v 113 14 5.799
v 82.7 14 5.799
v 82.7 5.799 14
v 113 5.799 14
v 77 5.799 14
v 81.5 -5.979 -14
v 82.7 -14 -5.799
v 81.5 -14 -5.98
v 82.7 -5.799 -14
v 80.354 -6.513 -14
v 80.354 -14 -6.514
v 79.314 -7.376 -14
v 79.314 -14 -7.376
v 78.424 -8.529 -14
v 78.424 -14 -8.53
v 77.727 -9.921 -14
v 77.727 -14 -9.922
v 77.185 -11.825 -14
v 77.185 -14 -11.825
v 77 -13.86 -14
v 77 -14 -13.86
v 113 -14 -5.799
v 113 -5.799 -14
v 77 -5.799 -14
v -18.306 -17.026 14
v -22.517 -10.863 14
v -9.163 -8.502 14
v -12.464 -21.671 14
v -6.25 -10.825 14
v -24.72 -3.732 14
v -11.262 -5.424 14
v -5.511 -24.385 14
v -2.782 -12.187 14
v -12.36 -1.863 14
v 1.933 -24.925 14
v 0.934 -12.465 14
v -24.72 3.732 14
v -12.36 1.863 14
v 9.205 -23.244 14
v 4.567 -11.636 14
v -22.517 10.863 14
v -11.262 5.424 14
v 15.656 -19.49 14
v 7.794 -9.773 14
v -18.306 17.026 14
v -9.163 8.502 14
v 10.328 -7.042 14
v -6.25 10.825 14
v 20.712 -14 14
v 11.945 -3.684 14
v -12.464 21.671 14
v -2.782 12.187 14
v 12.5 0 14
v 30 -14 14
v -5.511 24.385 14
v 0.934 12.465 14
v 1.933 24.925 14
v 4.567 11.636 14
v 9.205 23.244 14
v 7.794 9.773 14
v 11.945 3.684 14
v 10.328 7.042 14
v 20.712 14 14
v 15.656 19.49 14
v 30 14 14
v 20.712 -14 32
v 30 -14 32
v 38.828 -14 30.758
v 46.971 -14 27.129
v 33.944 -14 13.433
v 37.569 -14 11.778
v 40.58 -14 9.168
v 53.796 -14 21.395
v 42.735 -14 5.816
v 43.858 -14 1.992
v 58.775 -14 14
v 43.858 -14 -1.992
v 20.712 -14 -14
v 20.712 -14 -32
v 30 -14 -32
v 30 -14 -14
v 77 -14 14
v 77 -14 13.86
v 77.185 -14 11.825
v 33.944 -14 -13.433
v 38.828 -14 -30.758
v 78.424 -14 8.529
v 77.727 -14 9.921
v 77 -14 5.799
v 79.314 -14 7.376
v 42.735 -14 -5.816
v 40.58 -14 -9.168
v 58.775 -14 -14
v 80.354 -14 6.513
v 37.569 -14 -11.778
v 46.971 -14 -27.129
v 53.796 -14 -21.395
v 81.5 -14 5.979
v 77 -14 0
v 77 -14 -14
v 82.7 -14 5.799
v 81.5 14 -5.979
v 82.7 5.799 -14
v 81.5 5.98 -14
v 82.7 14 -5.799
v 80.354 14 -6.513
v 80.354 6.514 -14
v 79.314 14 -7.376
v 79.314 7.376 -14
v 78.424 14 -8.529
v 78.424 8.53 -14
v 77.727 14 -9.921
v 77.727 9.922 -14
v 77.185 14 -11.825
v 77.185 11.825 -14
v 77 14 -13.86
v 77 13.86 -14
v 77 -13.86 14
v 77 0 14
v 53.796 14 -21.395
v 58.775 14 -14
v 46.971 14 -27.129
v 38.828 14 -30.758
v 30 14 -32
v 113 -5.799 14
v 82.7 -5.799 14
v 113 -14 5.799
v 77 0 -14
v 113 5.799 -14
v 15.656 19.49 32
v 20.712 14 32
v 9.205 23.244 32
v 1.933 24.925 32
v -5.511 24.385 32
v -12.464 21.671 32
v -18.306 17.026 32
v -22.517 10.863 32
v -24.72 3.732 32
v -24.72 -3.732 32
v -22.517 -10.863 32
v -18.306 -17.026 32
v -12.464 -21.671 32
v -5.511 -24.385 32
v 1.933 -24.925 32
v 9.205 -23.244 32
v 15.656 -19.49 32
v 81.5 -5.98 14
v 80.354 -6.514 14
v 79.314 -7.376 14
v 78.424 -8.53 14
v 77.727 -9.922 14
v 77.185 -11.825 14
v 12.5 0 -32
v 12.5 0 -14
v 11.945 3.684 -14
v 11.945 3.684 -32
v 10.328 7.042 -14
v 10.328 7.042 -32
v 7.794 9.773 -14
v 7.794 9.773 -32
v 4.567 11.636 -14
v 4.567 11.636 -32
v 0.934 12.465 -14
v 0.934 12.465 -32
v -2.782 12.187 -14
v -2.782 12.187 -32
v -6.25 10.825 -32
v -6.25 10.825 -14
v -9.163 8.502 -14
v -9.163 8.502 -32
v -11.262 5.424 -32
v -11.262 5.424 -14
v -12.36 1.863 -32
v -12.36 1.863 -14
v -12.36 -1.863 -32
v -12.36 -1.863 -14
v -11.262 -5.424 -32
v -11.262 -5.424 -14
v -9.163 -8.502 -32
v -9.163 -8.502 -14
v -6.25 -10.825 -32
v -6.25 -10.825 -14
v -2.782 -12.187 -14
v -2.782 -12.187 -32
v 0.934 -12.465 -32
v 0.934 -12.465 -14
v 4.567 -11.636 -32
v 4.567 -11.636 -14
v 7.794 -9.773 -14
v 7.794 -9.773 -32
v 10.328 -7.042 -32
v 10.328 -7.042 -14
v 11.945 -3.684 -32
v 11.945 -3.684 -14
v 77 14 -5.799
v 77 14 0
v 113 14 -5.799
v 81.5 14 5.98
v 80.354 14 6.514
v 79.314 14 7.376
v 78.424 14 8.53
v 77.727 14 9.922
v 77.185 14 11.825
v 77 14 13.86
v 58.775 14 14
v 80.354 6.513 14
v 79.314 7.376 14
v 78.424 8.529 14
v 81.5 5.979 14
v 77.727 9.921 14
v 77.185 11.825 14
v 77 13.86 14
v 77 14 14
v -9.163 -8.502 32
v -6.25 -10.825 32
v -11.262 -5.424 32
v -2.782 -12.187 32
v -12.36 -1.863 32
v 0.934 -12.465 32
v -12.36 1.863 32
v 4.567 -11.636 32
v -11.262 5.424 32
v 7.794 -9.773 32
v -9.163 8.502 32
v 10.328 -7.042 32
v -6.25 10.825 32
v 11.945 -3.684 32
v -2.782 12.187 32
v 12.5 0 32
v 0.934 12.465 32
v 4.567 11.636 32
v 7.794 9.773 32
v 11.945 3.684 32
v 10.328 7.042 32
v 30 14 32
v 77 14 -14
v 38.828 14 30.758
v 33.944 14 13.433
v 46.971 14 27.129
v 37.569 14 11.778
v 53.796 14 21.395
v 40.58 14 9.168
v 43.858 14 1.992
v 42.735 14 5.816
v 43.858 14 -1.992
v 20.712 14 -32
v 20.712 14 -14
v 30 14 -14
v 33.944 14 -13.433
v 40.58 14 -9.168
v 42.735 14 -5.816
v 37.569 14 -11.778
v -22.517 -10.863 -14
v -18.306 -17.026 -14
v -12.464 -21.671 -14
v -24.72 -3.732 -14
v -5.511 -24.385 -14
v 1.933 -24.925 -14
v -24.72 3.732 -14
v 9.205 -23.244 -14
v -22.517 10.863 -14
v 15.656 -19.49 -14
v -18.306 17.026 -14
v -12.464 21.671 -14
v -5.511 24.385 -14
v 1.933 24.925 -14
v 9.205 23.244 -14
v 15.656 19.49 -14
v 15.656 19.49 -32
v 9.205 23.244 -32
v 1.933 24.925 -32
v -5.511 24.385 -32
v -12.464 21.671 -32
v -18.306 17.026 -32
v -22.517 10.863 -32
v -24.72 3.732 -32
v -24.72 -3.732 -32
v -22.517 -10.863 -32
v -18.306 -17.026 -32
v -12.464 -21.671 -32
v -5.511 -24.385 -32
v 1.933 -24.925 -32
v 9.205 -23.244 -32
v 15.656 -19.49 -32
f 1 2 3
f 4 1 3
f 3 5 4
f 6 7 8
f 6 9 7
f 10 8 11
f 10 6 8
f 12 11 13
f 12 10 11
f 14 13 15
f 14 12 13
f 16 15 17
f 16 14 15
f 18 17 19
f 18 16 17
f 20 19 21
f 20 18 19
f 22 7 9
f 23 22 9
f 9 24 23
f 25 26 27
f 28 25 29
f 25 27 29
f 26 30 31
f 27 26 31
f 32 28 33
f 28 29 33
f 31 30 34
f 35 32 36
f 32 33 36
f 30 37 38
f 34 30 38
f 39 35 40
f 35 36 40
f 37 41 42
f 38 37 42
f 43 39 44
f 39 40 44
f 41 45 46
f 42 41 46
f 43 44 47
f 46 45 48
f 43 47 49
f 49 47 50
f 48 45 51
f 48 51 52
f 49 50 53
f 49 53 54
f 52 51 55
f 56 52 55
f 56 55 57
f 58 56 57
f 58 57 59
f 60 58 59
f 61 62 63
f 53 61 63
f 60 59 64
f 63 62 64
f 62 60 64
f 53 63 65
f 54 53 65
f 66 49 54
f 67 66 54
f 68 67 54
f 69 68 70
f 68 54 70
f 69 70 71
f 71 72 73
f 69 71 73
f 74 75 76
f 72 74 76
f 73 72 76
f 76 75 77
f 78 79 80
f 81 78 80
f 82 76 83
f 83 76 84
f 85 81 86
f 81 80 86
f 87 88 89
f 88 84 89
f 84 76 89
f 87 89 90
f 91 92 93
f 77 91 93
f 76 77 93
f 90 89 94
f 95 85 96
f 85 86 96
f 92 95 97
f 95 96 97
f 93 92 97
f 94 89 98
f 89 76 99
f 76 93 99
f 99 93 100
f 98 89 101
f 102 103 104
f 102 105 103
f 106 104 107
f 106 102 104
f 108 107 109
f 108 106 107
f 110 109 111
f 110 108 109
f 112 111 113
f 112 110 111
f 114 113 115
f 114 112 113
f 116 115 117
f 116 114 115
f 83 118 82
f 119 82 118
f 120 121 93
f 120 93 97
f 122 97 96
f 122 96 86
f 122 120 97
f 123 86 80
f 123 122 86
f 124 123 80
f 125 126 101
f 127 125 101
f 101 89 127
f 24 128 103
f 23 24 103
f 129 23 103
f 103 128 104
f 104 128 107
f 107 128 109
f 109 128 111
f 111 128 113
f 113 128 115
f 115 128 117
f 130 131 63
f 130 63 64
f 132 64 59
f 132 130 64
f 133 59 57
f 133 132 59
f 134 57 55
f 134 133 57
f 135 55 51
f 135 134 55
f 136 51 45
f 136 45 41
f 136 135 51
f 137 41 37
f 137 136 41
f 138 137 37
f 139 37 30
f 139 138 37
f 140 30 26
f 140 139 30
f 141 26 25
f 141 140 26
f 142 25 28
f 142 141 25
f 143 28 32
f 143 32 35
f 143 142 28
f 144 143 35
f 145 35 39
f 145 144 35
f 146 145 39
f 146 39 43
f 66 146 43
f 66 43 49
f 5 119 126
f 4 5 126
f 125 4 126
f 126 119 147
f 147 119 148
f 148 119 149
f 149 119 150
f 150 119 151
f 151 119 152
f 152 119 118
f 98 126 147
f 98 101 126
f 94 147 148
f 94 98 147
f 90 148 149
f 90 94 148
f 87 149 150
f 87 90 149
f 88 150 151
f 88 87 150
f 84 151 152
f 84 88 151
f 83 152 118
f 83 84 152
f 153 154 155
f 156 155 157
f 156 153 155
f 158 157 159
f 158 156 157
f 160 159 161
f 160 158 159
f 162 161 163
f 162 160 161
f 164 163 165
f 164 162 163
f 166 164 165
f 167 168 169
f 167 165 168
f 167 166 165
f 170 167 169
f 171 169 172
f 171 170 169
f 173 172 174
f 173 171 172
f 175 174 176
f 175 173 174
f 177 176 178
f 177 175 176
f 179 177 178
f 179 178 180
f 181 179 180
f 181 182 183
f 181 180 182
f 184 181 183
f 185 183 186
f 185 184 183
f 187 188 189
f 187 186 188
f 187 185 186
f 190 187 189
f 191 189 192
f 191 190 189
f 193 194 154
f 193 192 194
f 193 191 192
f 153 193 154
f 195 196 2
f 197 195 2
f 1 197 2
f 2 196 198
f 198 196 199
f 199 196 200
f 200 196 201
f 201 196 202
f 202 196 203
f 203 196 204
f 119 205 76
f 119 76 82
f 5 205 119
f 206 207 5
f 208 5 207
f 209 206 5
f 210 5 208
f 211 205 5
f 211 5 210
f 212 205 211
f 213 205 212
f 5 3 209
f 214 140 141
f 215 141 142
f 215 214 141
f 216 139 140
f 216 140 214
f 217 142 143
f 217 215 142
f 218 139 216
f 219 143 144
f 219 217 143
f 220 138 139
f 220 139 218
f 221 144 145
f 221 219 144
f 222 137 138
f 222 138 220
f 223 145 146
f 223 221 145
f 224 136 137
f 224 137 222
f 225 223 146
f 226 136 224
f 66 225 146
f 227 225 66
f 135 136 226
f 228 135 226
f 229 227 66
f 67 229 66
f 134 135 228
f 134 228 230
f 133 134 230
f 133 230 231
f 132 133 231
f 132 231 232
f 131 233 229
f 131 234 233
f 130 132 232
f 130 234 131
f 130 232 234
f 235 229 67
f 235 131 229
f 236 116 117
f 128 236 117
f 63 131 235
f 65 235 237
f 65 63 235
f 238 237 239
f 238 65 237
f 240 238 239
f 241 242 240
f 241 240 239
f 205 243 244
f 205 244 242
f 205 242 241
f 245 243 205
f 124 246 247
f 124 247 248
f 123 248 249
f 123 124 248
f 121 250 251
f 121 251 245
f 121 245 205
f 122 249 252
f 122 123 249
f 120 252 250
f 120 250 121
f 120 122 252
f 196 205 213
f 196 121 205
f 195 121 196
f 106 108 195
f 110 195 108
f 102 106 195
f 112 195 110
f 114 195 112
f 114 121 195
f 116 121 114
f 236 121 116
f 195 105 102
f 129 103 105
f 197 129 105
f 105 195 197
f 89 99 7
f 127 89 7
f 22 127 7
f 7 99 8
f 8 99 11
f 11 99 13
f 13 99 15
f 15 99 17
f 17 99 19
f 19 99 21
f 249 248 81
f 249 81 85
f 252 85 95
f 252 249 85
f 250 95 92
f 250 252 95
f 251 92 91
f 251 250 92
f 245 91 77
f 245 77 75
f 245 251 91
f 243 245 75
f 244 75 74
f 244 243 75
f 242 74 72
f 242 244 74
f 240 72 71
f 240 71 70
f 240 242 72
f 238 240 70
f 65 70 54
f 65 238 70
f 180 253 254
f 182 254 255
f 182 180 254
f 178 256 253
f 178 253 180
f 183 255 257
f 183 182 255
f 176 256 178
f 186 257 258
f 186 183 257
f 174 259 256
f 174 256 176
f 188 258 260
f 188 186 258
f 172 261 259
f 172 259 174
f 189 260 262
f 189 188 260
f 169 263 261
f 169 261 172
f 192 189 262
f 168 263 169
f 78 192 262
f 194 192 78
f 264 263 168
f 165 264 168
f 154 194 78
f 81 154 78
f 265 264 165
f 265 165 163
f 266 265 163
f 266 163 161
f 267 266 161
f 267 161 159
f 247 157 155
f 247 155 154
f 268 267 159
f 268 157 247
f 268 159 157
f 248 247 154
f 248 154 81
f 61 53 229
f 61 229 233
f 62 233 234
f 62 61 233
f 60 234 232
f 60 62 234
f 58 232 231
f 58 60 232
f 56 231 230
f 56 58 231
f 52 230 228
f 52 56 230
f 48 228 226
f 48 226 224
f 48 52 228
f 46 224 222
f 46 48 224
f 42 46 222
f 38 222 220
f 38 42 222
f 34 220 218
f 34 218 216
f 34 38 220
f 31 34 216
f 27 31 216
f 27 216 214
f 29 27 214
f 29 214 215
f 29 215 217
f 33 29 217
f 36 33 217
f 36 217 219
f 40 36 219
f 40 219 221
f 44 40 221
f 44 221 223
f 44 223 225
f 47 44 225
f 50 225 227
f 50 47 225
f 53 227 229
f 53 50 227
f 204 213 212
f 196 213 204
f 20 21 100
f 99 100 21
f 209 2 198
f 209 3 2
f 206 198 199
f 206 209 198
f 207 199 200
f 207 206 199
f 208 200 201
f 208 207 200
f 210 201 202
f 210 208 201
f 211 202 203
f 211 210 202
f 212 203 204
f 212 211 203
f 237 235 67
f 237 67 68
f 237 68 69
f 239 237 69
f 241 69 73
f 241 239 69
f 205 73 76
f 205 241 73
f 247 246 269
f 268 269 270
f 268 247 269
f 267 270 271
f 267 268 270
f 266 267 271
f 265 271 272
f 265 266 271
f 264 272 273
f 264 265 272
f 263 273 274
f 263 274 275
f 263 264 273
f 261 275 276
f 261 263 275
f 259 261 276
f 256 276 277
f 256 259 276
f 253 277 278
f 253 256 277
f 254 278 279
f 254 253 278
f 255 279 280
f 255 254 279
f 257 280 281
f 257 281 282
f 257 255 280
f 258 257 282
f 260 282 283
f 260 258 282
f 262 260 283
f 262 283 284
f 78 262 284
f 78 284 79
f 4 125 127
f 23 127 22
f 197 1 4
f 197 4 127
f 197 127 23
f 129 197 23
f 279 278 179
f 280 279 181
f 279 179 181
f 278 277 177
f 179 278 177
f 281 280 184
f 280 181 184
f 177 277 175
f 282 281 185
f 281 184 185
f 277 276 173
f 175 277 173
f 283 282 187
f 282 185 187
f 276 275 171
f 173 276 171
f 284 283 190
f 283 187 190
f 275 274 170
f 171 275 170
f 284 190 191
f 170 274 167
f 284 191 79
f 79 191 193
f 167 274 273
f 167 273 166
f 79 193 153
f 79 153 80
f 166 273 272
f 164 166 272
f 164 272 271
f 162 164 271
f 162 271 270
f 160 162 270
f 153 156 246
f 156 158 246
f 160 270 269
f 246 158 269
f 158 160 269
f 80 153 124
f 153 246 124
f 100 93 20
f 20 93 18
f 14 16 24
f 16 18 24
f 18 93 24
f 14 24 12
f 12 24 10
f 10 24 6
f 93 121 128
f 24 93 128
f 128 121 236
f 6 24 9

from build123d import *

# Parameters (mm, degrees)
CROQUIS1_R              = 12.5
SALIENTE_EXTRUIR2_DEPTH = 32
CROQUIS3_W              = 110
CROQUIS3_H              = 28
CORTAR_EXTRUIR1_DEPTH   = 32
SALIENTE_EXTRUIR3_DEPTH = 28
CROQUIS9_W              = 30
CROQUIS9_H              = 28
SALIENTE_EXTRUIR4_DEPTH = 14
SALIENTE_EXTRUIR5_DEPTH = 36
REDONDEO2_R             = 5.7


with BuildPart() as part:
    # Croquis1 → Saliente-Extruir2 (new, symmetric)
    with BuildSketch(Plane.XY):
        with BuildLine():
            Line((20.712315177, -14), (30, -14))
            Line((30, -14), (30, 14))
            Line((30, 14), (20.712315177, 14))
            ThreePointArc((20.712315177, 14), (-25, 0), (20.712315177, -14))
        make_face()
        Circle(CROQUIS1_R, mode=Mode.SUBTRACT)
    extrude(amount=SALIENTE_EXTRUIR2_DEPTH, both=True)

    # Croquis3 → Cortar-Extruir1 (cut, symmetric)
    with BuildSketch(Plane(origin=(0, 0, 0), x_dir=(1, 0, 0), z_dir=(0, 1, 0))):
        with Locations((-25, 0)):
            Rectangle(CROQUIS3_W, CROQUIS3_H)
    extrude(amount=CORTAR_EXTRUIR1_DEPTH, both=True, mode=Mode.SUBTRACT)


with BuildPart() as cortar_extruir1_piece_1:
    # of the separate pieces the step leaves, piece 1, a body of its own (cortar_extruir1_pieces)
    add(part.part.solids().sort_by_distance((20.712315177, -14, -14))[0])



with BuildPart() as cortar_extruir1_piece_2:
    # of the separate pieces the step leaves, piece 2, a body of its own (cortar_extruir1_pieces)
    add(part.part.solids().sort_by_distance((20.712315177, -14, 32))[0])


with BuildPart() as cortar_extruir1_piece_1_1:
    add(cortar_extruir1_piece_1.part)

    add(cortar_extruir1_piece_2.part)  # Saliente-Extruir3 merges Cortar-Extruir1 piece 2
    # Croquis7 → Saliente-Extruir3 (add)
    with BuildSketch(Plane(origin=(0, 14, 0), x_dir=(1, 0, 0), z_dir=(0, 1, 0))):
        with BuildLine():
            Line((30, 32), (30, 14))
            ThreePointArc((30, 14), (44, 0), (30, -14))
            Line((30, -14), (30, -32))
            ThreePointArc((30, -32), (62, 0), (30, 32))
        make_face()
    extrude(amount=-SALIENTE_EXTRUIR3_DEPTH)

    # Croquis9 → Saliente-Extruir4 (add, symmetric)
    with BuildSketch(Plane(origin=(0, 0, 0), x_dir=(1, 0, 0), z_dir=(0, 1, 0))):
        with Locations((62, 0)):
            Rectangle(CROQUIS9_W, CROQUIS9_H)
    extrude(amount=SALIENTE_EXTRUIR4_DEPTH, both=True)

    # Croquis10 → Saliente-Extruir5 (add)
    with BuildSketch(Plane(origin=(77, 0, 0), x_dir=(0, 0, -1), z_dir=(1, 0, 0))):
        Polygon((-14.00015584, 5.798613627), (-13.99984415, -5.799366115), (-5.798613627, -14.00015584), (5.799366115, -13.99984415), (14.00015584, -5.798613627), (13.99984415, 5.799366115), (5.798613627, 14.00015584), (-5.799366115, 13.99984415), align=None)
    extrude(amount=SALIENTE_EXTRUIR5_DEPTH)

    # Redondeo2
    redondeo2_edges = [cortar_extruir1_piece_1_1.edges().sort_by_distance(p)[0] for p in [
        (77, -9.899683057, 9.899306813),
        (77, -9.899306813, -9.899683057),
        (77, 9.899683057, -9.899306813),
        (77, 9.899306813, 9.899683057),
    ]]
    fillet(redondeo2_edges, radius=REDONDEO2_R)


solid = cortar_extruir1_piece_1_1.part
